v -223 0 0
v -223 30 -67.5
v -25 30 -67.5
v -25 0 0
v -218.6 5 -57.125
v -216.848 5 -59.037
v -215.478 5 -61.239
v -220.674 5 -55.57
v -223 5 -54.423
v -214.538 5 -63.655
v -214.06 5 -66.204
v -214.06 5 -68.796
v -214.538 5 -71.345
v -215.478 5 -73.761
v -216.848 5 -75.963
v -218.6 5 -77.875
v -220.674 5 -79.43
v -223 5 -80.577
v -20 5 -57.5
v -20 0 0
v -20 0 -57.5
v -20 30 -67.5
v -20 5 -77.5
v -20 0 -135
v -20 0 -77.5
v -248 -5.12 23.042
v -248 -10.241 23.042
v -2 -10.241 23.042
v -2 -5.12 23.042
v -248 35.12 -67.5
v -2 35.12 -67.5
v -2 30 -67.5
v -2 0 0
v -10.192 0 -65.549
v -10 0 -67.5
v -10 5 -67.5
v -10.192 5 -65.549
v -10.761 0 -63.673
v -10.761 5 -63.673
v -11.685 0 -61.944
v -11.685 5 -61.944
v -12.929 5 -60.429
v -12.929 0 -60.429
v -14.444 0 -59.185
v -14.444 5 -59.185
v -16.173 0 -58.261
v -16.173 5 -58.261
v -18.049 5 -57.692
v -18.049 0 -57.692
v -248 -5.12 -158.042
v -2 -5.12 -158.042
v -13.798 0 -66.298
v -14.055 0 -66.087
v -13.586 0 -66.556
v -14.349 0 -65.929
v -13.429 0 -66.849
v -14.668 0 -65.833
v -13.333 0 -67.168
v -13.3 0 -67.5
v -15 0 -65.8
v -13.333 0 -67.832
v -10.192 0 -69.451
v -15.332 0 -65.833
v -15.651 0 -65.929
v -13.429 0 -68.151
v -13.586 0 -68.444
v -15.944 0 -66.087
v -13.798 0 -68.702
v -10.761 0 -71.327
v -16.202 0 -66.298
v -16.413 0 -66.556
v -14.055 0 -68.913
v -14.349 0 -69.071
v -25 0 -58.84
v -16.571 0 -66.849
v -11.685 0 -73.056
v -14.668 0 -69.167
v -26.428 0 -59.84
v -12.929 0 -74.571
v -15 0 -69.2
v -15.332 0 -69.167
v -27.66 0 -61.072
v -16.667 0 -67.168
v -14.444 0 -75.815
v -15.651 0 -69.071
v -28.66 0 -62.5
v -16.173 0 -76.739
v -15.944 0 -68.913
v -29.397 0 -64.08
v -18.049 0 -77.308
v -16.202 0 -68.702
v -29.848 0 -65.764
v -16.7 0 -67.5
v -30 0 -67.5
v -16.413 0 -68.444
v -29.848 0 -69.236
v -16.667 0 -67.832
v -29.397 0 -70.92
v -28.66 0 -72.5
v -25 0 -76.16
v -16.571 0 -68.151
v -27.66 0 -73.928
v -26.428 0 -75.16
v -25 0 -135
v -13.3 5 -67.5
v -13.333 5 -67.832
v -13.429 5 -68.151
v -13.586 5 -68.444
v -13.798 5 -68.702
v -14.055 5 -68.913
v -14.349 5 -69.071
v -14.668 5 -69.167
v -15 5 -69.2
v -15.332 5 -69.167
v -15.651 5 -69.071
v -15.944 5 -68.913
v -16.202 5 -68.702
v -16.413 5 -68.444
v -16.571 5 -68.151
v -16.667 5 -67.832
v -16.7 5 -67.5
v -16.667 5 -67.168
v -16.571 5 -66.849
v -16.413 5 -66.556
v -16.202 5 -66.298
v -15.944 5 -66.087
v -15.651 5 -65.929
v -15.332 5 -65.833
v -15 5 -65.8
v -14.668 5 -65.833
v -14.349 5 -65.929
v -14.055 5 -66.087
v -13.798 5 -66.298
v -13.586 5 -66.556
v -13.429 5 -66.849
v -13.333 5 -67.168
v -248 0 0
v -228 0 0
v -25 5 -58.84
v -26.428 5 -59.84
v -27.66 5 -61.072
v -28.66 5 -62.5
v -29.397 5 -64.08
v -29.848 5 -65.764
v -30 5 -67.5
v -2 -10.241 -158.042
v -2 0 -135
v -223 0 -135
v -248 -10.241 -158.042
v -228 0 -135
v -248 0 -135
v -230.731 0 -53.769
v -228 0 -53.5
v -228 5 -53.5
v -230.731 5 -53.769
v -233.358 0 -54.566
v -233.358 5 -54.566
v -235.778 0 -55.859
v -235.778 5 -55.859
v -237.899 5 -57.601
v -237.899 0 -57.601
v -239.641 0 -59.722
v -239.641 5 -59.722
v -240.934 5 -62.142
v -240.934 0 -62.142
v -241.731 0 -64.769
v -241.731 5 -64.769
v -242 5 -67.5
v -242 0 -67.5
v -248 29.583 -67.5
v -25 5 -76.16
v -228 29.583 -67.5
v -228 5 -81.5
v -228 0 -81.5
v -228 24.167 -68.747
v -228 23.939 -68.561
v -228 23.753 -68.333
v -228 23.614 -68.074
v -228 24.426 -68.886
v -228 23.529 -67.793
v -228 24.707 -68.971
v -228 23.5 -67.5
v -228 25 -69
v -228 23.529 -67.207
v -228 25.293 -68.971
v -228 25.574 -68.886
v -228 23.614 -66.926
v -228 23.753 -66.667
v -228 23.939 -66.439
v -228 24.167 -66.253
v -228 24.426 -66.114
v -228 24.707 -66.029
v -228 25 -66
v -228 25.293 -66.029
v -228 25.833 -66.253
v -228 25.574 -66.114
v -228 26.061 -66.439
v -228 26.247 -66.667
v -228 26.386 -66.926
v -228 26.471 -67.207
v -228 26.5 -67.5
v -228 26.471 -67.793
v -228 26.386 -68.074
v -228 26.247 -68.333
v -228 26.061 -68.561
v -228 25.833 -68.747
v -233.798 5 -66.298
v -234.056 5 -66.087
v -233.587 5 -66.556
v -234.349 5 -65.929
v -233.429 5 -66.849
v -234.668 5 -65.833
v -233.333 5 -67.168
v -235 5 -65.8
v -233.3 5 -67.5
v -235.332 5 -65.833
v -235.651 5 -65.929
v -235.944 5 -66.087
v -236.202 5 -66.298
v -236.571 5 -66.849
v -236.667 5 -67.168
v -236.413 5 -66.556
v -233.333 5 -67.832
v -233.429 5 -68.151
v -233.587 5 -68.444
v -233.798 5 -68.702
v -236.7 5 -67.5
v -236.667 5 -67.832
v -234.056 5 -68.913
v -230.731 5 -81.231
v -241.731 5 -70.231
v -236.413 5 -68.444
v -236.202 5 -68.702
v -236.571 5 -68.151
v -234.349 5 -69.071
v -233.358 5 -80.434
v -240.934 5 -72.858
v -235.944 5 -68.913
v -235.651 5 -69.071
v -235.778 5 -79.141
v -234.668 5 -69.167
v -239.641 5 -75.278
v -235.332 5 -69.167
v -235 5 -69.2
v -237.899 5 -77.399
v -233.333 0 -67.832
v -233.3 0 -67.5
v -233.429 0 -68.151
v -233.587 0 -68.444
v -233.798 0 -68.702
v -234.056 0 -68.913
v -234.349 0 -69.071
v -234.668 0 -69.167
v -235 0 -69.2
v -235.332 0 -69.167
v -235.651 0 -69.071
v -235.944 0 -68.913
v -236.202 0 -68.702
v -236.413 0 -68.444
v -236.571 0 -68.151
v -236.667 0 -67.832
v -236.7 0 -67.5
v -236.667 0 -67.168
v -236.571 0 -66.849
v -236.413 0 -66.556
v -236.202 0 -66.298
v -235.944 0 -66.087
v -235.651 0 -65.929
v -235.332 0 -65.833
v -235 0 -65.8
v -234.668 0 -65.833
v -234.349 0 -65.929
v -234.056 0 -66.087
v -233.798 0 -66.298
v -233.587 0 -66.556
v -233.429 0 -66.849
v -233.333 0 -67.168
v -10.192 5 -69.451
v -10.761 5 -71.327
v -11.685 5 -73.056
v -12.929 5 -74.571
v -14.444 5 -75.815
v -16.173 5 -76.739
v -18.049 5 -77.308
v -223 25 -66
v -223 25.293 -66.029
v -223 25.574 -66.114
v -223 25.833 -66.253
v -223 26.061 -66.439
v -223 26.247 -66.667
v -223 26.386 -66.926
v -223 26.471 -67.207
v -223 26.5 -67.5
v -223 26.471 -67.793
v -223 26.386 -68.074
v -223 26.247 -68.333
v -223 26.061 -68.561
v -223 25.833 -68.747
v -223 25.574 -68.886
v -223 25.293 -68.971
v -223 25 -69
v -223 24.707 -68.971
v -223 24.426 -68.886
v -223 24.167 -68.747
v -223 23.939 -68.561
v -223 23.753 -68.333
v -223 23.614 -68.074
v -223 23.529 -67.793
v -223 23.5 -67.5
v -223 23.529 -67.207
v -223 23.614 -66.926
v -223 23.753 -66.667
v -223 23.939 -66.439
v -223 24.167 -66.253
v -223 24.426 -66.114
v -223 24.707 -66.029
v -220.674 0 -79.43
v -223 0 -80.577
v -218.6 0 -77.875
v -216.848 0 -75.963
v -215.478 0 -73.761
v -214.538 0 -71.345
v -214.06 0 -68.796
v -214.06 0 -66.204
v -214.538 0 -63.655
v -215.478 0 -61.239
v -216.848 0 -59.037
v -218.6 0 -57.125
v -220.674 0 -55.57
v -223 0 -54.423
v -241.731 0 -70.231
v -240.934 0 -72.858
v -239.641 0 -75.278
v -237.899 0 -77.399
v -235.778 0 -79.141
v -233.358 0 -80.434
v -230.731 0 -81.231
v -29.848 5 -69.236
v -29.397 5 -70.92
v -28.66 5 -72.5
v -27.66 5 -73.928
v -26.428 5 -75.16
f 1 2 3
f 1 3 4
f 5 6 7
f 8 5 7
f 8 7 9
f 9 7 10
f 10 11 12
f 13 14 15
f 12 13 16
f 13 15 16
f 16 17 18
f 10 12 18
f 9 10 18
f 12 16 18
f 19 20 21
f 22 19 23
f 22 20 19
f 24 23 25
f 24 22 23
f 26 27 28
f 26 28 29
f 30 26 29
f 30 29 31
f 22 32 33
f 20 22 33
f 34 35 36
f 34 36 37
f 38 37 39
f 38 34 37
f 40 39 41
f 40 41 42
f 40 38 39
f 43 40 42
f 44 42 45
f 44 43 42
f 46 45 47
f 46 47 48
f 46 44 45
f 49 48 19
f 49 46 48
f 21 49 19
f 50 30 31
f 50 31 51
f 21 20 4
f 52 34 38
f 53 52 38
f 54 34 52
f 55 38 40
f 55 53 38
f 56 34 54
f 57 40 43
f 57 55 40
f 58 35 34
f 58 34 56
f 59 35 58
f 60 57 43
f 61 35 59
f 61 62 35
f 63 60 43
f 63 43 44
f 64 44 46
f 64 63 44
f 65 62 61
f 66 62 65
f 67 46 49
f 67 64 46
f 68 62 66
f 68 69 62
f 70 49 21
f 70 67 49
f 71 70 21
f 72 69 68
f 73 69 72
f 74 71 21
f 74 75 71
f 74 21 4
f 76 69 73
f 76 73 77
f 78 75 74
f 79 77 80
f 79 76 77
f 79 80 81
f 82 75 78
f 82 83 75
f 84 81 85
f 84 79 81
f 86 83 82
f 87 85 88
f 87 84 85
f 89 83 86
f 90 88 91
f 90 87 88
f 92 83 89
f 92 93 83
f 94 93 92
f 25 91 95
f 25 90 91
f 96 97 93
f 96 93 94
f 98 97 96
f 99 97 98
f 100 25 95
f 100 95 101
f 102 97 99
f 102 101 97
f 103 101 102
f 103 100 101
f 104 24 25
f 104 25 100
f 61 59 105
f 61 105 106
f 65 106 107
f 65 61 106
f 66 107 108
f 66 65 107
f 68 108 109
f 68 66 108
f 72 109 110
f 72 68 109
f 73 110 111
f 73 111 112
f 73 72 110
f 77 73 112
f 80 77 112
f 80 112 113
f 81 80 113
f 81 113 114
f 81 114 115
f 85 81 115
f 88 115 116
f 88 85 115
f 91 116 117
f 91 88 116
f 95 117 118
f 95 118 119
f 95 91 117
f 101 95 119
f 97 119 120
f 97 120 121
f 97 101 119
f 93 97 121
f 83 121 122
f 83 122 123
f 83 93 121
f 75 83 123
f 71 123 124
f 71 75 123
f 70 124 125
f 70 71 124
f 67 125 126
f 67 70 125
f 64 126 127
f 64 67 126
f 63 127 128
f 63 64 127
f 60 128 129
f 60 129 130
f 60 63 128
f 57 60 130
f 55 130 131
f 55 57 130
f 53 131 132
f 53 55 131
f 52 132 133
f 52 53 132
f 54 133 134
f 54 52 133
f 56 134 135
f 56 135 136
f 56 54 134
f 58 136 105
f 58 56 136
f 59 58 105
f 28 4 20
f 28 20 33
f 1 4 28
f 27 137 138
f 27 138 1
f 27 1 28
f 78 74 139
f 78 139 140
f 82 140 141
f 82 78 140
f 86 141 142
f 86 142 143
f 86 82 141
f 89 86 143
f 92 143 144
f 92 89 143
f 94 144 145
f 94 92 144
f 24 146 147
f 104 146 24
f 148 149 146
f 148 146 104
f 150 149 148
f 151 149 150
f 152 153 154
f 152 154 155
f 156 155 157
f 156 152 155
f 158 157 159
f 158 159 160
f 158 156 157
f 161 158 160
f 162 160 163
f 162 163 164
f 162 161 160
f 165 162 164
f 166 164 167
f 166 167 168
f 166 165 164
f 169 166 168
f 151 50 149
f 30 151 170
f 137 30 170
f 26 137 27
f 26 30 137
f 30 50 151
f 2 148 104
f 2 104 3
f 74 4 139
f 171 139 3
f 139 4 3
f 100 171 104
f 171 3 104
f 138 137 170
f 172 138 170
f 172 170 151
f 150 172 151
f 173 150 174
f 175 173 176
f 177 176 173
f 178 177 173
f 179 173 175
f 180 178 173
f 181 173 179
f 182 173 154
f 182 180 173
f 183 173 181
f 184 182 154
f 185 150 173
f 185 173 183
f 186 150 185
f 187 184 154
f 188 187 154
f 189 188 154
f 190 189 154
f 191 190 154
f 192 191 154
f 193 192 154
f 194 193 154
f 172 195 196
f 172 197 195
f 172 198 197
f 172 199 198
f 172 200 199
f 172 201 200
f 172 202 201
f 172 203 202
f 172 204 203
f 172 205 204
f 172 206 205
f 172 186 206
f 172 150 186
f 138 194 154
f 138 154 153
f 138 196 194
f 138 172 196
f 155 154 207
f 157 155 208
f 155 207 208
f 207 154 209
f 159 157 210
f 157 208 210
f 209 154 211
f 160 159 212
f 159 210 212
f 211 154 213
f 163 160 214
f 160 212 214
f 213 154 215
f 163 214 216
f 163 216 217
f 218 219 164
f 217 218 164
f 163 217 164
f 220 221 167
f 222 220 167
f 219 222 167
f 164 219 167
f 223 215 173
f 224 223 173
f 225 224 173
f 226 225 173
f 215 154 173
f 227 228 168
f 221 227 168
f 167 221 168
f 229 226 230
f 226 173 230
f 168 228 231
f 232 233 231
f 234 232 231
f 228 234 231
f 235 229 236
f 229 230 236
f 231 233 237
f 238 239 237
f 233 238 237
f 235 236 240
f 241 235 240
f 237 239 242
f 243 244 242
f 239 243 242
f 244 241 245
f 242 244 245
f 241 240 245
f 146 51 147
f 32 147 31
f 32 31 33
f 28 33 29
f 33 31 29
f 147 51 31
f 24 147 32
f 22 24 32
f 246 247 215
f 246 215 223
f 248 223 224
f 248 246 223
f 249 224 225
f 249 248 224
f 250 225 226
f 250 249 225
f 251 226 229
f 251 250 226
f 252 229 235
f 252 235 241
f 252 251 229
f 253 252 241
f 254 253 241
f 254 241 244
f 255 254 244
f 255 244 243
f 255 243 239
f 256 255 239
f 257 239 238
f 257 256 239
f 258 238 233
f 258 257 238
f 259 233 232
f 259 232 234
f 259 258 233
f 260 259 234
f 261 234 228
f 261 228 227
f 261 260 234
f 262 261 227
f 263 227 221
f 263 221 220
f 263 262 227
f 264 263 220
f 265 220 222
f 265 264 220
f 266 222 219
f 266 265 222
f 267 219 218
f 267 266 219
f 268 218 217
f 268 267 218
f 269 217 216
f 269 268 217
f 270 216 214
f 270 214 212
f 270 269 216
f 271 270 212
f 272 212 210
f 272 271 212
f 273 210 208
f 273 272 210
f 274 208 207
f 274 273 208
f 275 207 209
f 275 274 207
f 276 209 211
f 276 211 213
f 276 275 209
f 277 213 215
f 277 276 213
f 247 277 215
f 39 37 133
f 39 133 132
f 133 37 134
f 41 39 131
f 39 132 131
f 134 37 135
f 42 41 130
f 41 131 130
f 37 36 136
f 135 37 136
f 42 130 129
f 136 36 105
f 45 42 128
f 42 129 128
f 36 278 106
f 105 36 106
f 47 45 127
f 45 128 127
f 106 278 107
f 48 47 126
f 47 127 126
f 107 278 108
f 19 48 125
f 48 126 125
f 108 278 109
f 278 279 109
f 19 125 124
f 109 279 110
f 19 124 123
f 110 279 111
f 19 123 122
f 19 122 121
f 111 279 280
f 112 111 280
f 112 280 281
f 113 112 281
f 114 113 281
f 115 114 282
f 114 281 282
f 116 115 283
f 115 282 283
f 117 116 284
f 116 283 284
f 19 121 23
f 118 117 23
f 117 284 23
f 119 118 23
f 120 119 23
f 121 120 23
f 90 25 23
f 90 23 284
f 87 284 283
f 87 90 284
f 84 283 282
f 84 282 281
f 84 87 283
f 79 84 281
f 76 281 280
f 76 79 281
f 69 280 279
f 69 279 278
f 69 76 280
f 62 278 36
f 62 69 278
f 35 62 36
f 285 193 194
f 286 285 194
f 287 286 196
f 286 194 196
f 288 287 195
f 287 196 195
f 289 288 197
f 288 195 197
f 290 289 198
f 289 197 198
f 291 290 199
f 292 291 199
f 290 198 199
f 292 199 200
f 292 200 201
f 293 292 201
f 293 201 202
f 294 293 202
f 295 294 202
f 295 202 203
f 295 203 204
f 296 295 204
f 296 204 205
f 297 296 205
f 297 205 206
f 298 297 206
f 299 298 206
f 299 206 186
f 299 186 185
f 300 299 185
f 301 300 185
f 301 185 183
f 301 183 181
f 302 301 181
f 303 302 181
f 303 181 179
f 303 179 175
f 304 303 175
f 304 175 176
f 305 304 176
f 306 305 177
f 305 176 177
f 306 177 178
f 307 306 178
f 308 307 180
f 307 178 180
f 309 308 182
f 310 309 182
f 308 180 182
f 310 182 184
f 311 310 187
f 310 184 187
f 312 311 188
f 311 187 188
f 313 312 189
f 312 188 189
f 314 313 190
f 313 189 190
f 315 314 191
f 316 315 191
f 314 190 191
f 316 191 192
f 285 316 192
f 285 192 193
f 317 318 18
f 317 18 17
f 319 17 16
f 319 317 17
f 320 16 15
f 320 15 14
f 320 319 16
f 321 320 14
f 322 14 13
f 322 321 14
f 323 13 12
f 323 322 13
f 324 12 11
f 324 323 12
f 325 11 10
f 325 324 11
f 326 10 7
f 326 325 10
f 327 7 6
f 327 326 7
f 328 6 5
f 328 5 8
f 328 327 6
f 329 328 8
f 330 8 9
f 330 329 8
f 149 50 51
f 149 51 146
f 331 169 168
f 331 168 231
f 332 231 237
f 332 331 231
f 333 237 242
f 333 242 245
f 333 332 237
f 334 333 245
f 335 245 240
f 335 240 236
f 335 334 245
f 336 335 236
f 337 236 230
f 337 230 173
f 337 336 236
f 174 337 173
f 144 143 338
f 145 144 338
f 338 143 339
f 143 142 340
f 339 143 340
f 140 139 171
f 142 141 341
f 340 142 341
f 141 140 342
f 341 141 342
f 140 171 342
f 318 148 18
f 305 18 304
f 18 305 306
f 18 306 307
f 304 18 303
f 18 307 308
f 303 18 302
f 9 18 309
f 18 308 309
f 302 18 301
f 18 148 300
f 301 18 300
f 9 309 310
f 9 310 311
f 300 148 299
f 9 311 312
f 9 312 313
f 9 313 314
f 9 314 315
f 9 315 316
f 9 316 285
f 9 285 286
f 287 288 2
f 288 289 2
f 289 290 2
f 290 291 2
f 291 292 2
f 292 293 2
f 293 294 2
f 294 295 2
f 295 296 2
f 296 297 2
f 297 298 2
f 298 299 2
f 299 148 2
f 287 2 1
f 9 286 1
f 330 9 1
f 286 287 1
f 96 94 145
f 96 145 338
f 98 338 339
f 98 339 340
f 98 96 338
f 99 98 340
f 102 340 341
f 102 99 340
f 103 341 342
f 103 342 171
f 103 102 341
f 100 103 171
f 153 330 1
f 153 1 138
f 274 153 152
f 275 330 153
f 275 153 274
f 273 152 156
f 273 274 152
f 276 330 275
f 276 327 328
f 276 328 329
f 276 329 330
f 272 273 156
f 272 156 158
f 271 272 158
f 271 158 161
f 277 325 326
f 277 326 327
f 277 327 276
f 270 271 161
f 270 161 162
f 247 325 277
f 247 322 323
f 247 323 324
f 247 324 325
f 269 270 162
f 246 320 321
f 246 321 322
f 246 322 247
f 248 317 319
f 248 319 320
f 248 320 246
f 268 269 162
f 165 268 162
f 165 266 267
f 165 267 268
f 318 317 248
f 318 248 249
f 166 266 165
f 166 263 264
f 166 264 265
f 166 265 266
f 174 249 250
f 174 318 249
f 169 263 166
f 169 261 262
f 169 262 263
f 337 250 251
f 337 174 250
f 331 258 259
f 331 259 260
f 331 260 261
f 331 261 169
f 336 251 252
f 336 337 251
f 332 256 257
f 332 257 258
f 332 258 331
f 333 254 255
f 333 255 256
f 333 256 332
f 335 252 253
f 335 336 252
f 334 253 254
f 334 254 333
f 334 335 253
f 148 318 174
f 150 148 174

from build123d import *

# Parameters (mm, degrees)
BOSS_EXTRUDE1_DEPTH      = 0.0001
BOSS_EXTRUDE1_DEPTH_BACK = 248
BOSS_EXTRUDE2_DEPTH      = 25
CUT_EXTRUDE1_DEPTH       = 20
BOSS_EXTRUDE3_DEPTH      = 25
CUT_EXTRUDE2_DEPTH       = 20
BOSS_EXTRUDE4_DEPTH      = 5
BOSS_EXTRUDE5_DEPTH      = 5
SKETCH8_R                = 1.5
CUT_EXTRUDE3_DEPTH       = 10
SKETCH9_W                = 70
SKETCH9_H                = 5.120472302
BOSS_EXTRUDE7_DEPTH      = 250
SKETCH11_W               = 70
SKETCH11_H               = 5.120472302
CUT_EXTRUDE4_DEPTH       = 250
CUT_EXTRUDE5_DEPTH       = 2


with BuildPart() as part:
    # Sketch1 → Boss-Extrude1 (new, two sides: drawn at the far end of the back side and taken through both)
    with BuildSketch(Plane(origin=(0, 0, 0), x_dir=(0, 0, -1), z_dir=(1, 0, 0)).offset(-BOSS_EXTRUDE1_DEPTH_BACK)):
        Polygon((-23.04212536, -5.120472302), (67.5, 35.120472302), (158.04212536, -5.120472302), (158.04212536, -10.240944604), (135, 0), (67.5, 30), (0, 0), (-23.04212536, -10.240944604), align=None)
    extrude(amount=BOSS_EXTRUDE1_DEPTH + BOSS_EXTRUDE1_DEPTH_BACK)

    # Sketch2 → Boss-Extrude2 (add)
    with BuildSketch(Plane(origin=(0.0001, 0, 0), x_dir=(0, 0, -1), z_dir=(1, 0, 0))):
        Polygon((0, 0), (135, 0), (67.5, 30), align=None)
    extrude(amount=-BOSS_EXTRUDE2_DEPTH)

    # Sketch3 → Cut-Extrude1 (cut)
    with BuildSketch(Plane(origin=(0.0001, 0, 0), x_dir=(0, 0, -1), z_dir=(1, 0, 0))):
        Polygon((0, 0), (135, 0), (67.5, 30), align=None)
    extrude(amount=-CUT_EXTRUDE1_DEPTH, mode=Mode.SUBTRACT)

    # Sketch4 → Boss-Extrude3 (add)
    with BuildSketch(Plane.ZY.offset(248)):
        Polygon((-135, 0), (0, 0), (-67.5, 30), align=None)
    extrude(amount=-BOSS_EXTRUDE3_DEPTH)

    # Sketch5 → Cut-Extrude2 (cut)
    with BuildSketch(Plane.ZY.offset(248)):
        Polygon((-135, 0), (0, 0), (-67.5, 29.582678365), align=None)
    extrude(amount=-CUT_EXTRUDE2_DEPTH, mode=Mode.SUBTRACT)

    # Sketch6 → Boss-Extrude4 (add)
    with BuildSketch(Plane(origin=(0, 0, 0), x_dir=(-1, 0, 0), z_dir=(0, -1, 0))):
        with BuildLine():
            ThreePointArc((233.3, 67.5), (235, 69.2), (236.7, 67.5))
            Line((236.7, 67.5), (242, 67.5))
            ThreePointArc((242, 67.5), (237.899494937, 77.399494937), (228, 81.5))
            Line((228, 81.5), (228, 67.5))
            Line((228, 67.5), (233.3, 67.5))
        make_face()
        with BuildLine():
            Line((242, 67.5), (236.7, 67.5))
            ThreePointArc((236.7, 67.5), (235, 65.8), (233.3, 67.5))
            Line((233.3, 67.5), (228, 67.5))
            Line((228, 67.5), (228, 53.5))
            ThreePointArc((228, 53.5), (237.899494937, 57.600505063), (242, 67.5))
        make_face()
        with BuildLine():
            Line((223, 54.423303169), (223, 80.576696831))
            ThreePointArc((223, 80.576696831), (214, 67.5), (223, 54.423303169))
        make_face()
        with BuildLine():
            Line((228, 67.5), (228, 81.5))
            ThreePointArc((228, 81.5), (225.457732865, 81.267239295), (223, 80.576696831))
            Line((223, 80.576696831), (223, 54.423303169))
            ThreePointArc((223, 54.423303169), (225.457732865, 53.732760705), (228, 53.5))
            Line((228, 53.5), (228, 67.5))
        make_face()
    extrude(amount=-BOSS_EXTRUDE4_DEPTH)

    # Sketch7 → Boss-Extrude5 (add)
    with BuildSketch(Plane(origin=(0, 0, 0), x_dir=(-1, 0, 0), z_dir=(0, -1, 0))):
        with BuildLine():
            Line((19.9999, 57.5001), (19.9999, 67.5))
            Line((19.9999, 67.5), (16.69995, 67.5))
            ThreePointArc((16.69995, 67.5), (14.99995, 65.8), (13.29995, 67.5))
            Line((13.29995, 67.5), (10, 67.5))
            ThreePointArc((10, 67.5), (12.928902899, 60.429002899), (19.9999, 57.5001))
        make_face()
        with BuildLine():
            Line((16.69995, 67.5), (19.9999, 67.5))
            Line((19.9999, 67.5), (19.9999, 77.4999))
            ThreePointArc((19.9999, 77.4999), (12.928902899, 74.570997101), (10, 67.5))
            Line((10, 67.5), (13.29995, 67.5))
            ThreePointArc((13.29995, 67.5), (14.99995, 69.2), (16.69995, 67.5))
        make_face()
        with BuildLine():
            Line((19.9999, 77.4999), (19.9999, 67.5))
            Line((19.9999, 67.5), (19.9999, 57.5001))
            ThreePointArc((19.9999, 57.5001), (22.588092453, 57.840845801), (24.9999, 58.839861432))
            Line((24.9999, 58.839861432), (24.9999, 76.160138568))
            ThreePointArc((24.9999, 76.160138568), (22.588092453, 77.159154199), (19.9999, 77.4999))
        make_face()
        with BuildLine():
            ThreePointArc((29.9998, 67.5), (28.660081869, 72.499925), (24.9999, 76.160138568))
            Line((24.9999, 76.160138568), (24.9999, 58.839861432))
            ThreePointArc((24.9999, 58.839861432), (28.660081869, 62.500075), (29.9998, 67.5))
        make_face()
    extrude(amount=-BOSS_EXTRUDE5_DEPTH)

    # Sketch8 → Cut-Extrude3 (cut)
    with BuildSketch(Plane.ZY.offset(228)):
        with Locations((-67.5, 25)):
            Circle(SKETCH8_R)
    extrude(amount=-CUT_EXTRUDE3_DEPTH, mode=Mode.SUBTRACT)

    # Sketch9 → Boss-Extrude7 (add)
    with BuildSketch(Plane.ZY.offset(248)):
        with Locations((58.04212536, -7.680708453)):
            Rectangle(SKETCH9_W, SKETCH9_H)
    extrude(amount=-BOSS_EXTRUDE7_DEPTH)

    # Sketch11 → Cut-Extrude4 (cut)
    with BuildSketch(Plane.ZY.offset(248)):
        with Locations((58.04212536, -7.680708453)):
            Rectangle(SKETCH11_W, SKETCH11_H)
    extrude(amount=-CUT_EXTRUDE4_DEPTH, mode=Mode.SUBTRACT)

    # Sketch12 → Cut-Extrude5 (cut)
    with BuildSketch(Plane(origin=(0.0001, 0, 0), x_dir=(0, 0, -1), z_dir=(1, 0, 0))):
        Polygon((-23.04212536, -5.120472302), (67.5, 35.120472302), (158.04212536, -5.120472302), (158.04212536, -10.240944604), (67.5, 30), (-23.04212536, -10.240944604), align=None)
    extrude(amount=-CUT_EXTRUDE5_DEPTH, mode=Mode.SUBTRACT)


solid = part.part
